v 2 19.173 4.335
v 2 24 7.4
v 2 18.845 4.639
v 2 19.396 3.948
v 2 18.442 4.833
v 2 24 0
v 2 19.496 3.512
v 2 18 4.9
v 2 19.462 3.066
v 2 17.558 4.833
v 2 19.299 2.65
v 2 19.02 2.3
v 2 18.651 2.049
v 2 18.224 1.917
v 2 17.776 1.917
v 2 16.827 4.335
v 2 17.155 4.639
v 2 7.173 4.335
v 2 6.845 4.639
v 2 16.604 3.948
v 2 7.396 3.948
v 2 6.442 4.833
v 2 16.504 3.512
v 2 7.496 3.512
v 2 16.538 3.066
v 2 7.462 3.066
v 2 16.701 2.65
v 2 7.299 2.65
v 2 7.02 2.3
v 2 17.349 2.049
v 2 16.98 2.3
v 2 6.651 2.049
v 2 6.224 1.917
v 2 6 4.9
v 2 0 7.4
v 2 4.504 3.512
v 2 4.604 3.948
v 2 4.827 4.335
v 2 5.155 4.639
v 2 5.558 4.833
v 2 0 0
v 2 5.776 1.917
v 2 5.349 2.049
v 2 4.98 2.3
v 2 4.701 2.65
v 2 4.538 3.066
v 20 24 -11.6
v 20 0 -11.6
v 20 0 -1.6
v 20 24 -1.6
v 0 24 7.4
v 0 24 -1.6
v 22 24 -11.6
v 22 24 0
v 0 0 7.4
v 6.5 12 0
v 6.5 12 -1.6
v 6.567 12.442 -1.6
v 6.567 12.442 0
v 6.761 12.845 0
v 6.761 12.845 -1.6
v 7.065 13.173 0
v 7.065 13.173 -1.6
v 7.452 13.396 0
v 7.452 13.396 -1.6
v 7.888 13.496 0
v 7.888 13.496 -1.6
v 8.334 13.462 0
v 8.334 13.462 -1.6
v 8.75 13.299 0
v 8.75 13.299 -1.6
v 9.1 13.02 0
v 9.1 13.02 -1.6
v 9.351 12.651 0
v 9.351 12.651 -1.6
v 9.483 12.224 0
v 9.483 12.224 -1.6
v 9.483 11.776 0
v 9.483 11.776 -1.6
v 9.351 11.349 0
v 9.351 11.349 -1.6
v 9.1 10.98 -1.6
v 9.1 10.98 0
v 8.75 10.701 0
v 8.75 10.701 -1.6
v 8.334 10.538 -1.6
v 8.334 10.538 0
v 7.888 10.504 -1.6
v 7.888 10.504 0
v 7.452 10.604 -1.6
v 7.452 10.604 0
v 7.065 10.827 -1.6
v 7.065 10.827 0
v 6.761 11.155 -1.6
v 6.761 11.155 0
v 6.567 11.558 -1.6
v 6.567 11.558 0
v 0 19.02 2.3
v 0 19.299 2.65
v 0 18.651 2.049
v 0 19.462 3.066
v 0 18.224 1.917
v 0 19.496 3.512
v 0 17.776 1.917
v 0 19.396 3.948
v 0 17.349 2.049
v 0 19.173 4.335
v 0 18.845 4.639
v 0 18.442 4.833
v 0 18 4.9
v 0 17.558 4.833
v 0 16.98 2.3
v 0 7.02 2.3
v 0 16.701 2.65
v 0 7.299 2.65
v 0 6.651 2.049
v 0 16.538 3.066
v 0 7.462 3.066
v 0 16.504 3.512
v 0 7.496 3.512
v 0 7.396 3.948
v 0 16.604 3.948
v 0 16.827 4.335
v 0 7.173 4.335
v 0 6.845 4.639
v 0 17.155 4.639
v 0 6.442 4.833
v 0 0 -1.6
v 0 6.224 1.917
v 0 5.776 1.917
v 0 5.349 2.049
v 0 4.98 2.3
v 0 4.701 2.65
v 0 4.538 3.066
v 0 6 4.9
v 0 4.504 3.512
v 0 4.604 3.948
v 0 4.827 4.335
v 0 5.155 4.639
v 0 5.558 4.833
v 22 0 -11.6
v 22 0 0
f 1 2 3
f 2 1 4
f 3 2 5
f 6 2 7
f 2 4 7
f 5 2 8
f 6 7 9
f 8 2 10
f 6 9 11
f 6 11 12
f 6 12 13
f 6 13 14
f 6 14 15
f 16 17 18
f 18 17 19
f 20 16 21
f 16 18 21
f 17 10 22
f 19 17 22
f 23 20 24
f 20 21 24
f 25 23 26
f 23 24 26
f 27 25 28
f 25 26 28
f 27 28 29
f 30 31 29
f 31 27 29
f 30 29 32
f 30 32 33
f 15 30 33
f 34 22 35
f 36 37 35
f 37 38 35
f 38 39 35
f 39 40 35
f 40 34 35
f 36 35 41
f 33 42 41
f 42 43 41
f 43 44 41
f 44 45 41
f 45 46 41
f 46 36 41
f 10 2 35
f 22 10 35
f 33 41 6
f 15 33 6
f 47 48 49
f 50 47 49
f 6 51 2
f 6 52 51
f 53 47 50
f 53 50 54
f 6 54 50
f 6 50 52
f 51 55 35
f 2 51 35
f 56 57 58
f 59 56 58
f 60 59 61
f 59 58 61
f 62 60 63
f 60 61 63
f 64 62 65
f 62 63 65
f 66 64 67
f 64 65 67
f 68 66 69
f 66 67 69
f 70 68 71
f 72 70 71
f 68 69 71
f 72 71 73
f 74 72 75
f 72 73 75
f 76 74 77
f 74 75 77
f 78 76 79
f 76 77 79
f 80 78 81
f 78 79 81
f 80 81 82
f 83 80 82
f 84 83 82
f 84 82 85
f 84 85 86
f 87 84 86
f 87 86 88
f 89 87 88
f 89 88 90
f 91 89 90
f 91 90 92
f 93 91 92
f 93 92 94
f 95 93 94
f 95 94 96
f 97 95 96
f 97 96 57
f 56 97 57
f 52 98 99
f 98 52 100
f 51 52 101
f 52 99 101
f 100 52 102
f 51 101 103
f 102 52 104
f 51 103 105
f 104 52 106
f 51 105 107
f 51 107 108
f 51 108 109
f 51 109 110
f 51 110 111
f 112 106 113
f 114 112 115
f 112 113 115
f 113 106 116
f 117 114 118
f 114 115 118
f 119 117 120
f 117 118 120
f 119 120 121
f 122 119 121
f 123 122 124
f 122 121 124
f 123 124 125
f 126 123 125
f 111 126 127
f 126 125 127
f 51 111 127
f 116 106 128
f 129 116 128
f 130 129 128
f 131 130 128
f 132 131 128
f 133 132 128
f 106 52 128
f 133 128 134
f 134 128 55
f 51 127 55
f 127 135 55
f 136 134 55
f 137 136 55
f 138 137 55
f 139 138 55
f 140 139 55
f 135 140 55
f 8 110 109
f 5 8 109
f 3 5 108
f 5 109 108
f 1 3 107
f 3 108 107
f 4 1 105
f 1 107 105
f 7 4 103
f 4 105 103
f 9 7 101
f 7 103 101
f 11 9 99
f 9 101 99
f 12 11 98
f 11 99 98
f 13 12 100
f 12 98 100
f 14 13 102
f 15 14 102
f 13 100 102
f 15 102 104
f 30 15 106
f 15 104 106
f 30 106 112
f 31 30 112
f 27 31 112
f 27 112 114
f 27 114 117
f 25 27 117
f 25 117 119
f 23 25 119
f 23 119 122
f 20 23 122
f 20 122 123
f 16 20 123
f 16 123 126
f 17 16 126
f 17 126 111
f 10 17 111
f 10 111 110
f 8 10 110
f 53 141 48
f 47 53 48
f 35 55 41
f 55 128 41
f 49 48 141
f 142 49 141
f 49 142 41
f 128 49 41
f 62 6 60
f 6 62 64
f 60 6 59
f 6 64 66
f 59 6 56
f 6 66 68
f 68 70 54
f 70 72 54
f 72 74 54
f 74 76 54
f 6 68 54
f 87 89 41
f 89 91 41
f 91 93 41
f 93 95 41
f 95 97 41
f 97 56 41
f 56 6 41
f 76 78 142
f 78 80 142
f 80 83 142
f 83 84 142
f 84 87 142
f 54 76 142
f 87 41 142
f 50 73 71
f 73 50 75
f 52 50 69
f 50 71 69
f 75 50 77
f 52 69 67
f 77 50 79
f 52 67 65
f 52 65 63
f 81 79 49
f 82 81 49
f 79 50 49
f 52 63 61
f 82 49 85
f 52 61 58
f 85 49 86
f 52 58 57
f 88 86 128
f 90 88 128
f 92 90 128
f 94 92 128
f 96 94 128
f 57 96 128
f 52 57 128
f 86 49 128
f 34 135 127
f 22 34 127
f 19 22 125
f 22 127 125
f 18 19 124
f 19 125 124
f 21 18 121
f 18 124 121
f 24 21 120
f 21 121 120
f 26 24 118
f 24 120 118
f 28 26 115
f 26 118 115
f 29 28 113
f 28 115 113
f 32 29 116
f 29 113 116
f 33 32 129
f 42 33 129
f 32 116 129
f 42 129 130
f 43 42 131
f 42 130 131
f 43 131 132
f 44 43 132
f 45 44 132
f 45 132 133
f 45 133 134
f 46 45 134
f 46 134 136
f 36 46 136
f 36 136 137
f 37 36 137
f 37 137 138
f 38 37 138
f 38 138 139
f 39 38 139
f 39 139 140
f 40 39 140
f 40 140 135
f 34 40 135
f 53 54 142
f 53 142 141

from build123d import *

# Parameters (mm, degrees)
RESSALTO_EXTRUS_O2_DEPTH = 24
ESBO_O2_R                = 1.5
CORTE_EXTRUS_O1_DEPTH    = 24
ESBO_O6_R                = 1.5
CORTE_EXTRUS_O2_DEPTH    = 13


with BuildPart() as part:
    # Esboço1 → Ressalto-extrusão2 (new body)
    with BuildSketch(Plane(origin=(0, 0, 0), x_dir=(1, 0, 0), z_dir=(0, 1, 0))):
        Polygon((0, 0), (0, -7.4), (2, -7.4), (2, 0), (22, 0), (22, 11.6), (20, 11.6), (20, 1.6), (0, 1.6), align=None)
    extrude(amount=RESSALTO_EXTRUS_O2_DEPTH)

    # Esboço2 → Corte-extrusão1 (cut)
    with BuildSketch(Plane.ZY):
        with Locations((3.4, 18)):
            Circle(ESBO_O2_R)
        with Locations((3.4, 6)):
            Circle(ESBO_O2_R)
    extrude(amount=-CORTE_EXTRUS_O1_DEPTH, mode=Mode.SUBTRACT)

    # Esboço6 → Corte-extrusão2 (cut)
    with BuildSketch(Plane(origin=(0, 0, -1.6), x_dir=(-1, 0, 0), z_dir=(0, 0, -1))):
        with Locations((-8, 12)):
            Circle(ESBO_O6_R)
    extrude(amount=-CORTE_EXTRUS_O2_DEPTH, mode=Mode.SUBTRACT)


solid = part.part
